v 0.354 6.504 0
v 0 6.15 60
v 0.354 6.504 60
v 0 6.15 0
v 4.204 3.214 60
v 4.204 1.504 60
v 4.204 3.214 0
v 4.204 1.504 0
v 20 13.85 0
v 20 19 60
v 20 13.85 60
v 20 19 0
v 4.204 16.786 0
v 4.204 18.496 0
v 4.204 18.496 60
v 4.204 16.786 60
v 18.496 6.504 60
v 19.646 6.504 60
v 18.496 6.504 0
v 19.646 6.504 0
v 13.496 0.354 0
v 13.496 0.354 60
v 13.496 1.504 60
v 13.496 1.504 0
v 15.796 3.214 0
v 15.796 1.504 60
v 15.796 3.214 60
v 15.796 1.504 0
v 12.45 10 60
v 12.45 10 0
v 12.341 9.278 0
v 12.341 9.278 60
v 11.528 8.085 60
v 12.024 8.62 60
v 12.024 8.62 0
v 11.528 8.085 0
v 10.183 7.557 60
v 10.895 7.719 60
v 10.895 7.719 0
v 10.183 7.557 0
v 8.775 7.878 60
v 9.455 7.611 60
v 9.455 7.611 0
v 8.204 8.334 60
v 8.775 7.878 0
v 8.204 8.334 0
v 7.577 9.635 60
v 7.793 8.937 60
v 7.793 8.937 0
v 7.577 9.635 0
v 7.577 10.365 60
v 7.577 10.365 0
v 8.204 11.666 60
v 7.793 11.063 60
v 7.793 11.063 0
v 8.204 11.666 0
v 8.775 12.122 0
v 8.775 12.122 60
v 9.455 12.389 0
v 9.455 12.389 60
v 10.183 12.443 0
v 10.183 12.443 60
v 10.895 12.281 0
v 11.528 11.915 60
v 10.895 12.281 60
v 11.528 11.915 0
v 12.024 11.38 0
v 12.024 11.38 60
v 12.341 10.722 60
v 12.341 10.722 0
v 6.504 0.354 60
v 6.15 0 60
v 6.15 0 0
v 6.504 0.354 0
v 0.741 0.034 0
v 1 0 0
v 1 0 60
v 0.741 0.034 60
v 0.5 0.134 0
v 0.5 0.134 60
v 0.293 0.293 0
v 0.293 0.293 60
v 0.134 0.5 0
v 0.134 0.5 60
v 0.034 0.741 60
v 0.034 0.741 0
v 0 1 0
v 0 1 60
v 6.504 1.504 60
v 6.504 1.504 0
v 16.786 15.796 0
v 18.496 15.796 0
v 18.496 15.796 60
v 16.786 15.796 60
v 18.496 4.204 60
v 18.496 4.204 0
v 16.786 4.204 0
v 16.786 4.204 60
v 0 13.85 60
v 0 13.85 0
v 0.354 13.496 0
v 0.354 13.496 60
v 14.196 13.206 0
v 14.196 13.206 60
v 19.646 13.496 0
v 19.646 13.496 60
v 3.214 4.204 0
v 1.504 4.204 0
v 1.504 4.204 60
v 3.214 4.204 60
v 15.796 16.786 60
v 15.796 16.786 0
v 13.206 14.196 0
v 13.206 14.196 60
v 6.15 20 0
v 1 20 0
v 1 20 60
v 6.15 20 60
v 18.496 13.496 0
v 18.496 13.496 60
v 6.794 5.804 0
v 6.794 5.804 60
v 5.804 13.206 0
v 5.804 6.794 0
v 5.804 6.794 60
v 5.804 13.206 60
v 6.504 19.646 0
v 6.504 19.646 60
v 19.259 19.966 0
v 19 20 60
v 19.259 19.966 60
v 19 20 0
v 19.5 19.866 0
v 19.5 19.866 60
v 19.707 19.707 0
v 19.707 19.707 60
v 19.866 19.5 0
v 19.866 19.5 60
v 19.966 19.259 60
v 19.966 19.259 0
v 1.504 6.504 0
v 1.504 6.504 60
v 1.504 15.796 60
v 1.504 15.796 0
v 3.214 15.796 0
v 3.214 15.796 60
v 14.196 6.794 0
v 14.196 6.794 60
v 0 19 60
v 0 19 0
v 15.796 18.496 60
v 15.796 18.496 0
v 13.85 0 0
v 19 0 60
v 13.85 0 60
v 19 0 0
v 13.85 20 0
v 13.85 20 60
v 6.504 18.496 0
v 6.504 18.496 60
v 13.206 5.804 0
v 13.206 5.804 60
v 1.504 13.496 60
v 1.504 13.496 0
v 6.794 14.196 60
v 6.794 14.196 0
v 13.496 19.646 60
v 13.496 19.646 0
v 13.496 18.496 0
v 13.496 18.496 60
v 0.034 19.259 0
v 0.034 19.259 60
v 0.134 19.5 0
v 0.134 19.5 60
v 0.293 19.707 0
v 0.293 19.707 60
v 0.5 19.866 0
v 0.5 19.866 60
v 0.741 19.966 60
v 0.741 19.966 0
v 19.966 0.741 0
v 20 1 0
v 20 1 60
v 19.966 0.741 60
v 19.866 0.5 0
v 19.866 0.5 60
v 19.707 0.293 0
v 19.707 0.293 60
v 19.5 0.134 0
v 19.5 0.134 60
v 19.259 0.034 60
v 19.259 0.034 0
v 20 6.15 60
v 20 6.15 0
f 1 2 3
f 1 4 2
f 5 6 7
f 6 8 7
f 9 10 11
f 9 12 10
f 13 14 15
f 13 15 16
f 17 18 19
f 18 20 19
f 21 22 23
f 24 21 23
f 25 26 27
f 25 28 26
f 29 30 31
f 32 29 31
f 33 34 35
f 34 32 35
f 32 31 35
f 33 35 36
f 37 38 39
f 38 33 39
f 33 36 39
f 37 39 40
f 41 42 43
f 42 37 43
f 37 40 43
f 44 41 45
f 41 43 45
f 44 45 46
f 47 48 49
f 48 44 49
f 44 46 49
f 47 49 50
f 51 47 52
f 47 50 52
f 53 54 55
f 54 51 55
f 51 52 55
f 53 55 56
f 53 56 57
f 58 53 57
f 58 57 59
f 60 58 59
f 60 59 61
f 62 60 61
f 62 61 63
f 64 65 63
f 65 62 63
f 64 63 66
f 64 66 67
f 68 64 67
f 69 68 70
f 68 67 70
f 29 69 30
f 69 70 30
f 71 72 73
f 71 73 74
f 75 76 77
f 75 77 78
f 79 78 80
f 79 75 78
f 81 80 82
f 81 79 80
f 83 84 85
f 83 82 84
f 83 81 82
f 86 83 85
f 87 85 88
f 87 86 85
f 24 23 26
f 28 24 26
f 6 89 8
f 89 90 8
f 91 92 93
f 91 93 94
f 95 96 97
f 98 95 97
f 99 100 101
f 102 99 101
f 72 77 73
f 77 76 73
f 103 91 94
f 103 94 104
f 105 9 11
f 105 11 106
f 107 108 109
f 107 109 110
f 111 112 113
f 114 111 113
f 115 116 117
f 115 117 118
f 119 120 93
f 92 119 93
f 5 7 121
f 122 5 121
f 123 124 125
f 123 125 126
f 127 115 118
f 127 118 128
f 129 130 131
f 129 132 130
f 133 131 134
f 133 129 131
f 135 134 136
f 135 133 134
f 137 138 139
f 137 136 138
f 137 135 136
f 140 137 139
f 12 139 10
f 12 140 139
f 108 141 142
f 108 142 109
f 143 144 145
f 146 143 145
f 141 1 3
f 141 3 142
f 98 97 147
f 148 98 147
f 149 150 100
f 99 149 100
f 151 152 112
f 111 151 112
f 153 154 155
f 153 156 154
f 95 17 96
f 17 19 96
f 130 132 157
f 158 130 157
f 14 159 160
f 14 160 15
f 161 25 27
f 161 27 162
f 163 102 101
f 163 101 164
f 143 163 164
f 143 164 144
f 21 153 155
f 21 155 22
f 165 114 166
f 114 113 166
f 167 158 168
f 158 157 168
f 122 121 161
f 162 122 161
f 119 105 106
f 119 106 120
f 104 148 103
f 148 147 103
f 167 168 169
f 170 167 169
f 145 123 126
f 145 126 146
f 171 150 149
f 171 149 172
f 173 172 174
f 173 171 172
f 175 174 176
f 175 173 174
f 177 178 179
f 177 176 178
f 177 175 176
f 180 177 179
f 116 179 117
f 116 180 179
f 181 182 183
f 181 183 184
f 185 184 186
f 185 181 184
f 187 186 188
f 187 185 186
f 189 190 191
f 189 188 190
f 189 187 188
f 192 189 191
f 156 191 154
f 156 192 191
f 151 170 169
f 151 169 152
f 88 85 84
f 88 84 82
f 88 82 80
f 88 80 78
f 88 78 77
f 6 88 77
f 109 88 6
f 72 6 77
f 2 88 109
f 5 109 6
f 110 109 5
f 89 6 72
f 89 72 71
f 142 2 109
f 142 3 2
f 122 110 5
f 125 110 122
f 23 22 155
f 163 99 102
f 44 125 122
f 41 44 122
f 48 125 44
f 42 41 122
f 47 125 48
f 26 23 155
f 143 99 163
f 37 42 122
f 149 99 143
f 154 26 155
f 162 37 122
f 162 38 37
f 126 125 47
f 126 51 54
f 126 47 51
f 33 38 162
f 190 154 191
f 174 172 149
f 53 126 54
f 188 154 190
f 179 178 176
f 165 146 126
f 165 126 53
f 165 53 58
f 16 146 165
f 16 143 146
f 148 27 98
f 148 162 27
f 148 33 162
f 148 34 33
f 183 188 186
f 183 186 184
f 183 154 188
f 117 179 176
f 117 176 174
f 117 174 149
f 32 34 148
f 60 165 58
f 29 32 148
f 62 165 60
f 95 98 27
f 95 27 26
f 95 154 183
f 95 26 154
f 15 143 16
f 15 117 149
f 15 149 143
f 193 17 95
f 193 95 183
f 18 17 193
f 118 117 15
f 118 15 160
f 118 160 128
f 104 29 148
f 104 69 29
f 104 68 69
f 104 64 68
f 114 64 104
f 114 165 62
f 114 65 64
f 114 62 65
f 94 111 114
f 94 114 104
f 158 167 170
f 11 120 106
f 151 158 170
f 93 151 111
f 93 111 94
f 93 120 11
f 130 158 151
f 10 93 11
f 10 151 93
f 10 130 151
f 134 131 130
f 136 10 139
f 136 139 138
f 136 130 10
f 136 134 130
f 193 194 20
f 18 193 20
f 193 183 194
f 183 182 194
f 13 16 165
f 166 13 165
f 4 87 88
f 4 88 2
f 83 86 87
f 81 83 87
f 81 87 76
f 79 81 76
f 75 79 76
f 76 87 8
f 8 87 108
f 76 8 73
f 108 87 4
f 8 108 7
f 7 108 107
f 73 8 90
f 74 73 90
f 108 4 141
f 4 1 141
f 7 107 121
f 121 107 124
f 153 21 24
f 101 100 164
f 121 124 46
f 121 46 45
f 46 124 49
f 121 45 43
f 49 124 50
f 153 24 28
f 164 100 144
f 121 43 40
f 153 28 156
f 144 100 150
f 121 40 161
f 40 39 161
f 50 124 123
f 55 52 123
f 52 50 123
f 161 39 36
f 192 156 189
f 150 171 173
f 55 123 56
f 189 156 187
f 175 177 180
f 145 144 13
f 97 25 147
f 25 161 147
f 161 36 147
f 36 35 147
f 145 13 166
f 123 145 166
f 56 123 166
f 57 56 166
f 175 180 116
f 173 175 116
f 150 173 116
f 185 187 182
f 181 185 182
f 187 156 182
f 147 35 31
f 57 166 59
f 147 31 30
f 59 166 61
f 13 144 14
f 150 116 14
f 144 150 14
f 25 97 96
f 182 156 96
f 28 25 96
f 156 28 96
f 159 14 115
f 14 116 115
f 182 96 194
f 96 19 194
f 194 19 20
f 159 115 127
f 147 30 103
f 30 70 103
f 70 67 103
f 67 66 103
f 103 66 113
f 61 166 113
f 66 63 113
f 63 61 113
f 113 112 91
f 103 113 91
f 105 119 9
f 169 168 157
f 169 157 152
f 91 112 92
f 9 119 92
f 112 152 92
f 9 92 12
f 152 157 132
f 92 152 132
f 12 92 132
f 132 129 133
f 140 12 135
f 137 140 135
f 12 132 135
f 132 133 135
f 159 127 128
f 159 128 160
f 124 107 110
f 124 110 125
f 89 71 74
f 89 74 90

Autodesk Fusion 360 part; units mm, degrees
sketch "Sketch1" plane through (0, 0, 0) normal (0, 0, 1) x (1, 0, 0)
  line L0 (0, 1) -> (0, 6.1503)
  line L1 (1, 0) -> (6.15, 0)
  line L2 (0.3536, 6.5038) -> (1.5038, 6.5038)
  line L3 (1.5038, 6.5038) -> (1.5038, 4.2038)
  line L4 (1.5038, 4.2038) -> (3.2139, 4.2038)
  line L5 (3.2139, 4.2038) -> (5.804, 6.7939)
  line L6 (6.5036, 0.3536) -> (6.5036, 1.5036)
  line L7 (6.5036, 1.5036) -> (4.2036, 1.5036)
  line L8 (4.2036, 1.5036) -> (4.2036, 3.2136)
  line L9 (4.2036, 3.2136) -> (6.7937, 5.8037)
  line L10 (0, 6.1503) -> (0.3536, 6.5038)
  line L11 (6.15, 0) -> (6.5036, 0.3536)
  circle A0 centre (10, 10) radius 2.45
  line L12 (10, 10) -> (0, 0) construction
  line L13 (0, 19) -> (0, 13.85)
  line L14 (1, 20) -> (6.15, 20)
  line L15 (0, 13.85) -> (0.3536, 13.4964)
  line L16 (0, 13.85) -> (0.5, 13.85) construction
  line L17 (0.3536, 13.4964) -> (1.5036, 13.4964)
  line L18 (1.5036, 13.4964) -> (1.5036, 15.7964)
  line L19 (0, 20) -> (10, 10) construction
  line L20 (5.804, 6.7939) -> (5.804, 13.2061)
  line L21 (5.804, 13.2061) -> (3.2139, 15.7962)
  line L22 (1.5036, 15.7964) -> (3.2139, 15.7962)
  line L23 (6.15, 20) -> (6.5036, 19.6464)
  line L24 (6.15, 20) -> (6.65, 20) construction
  line L25 (6.5036, 19.6464) -> (6.5036, 18.4964)
  line L26 (6.5036, 18.4964) -> (4.2036, 18.4964)
  line L27 (4.2036, 18.4964) -> (4.2036, 16.7864)
  line L28 (4.2036, 16.7864) -> (6.7937, 14.1963)
  line L29 (10, 10) -> (20, 20) construction
  line L30 (10, 10) -> (20, 0) construction
  line L31 (19, 20) -> (13.85, 20)
  line L32 (20, 19) -> (20, 13.85)
  line L33 (13.85, 20) -> (13.4964, 19.6464)
  line L34 (13.85, 20) -> (14.35, 20) construction
  line L35 (13.4964, 19.6464) -> (13.4964, 18.4964)
  line L36 (20, 13.85) -> (19.6464, 13.4964)
  line L37 (20, 13.85) -> (20.5, 13.85) construction
  line L38 (19.6464, 13.4964) -> (18.4964, 13.4964)
  line L39 (13.4964, 18.4964) -> (15.7964, 18.4964)
  line L40 (18.4964, 13.4964) -> (18.4964, 15.7964)
  line L41 (15.7964, 18.4964) -> (15.7964, 16.7864)
  line L42 (15.7964, 16.7864) -> (13.2064, 14.1963)
  line L43 (13.2064, 14.1963) -> (6.7937, 14.1963)
  line L44 (18.4964, 15.7964) -> (16.7864, 15.7964)
  line L45 (16.7864, 15.7964) -> (14.1963, 13.2063)
  line L46 (19, 0) -> (13.85, 0)
  line L47 (20, 1) -> (20, 6.15)
  line L48 (13.85, 0) -> (13.4964, 0.3536)
  line L49 (13.85, 0) -> (14.35, 0) construction
  line L50 (13.4964, 0.3536) -> (13.4964, 1.5036)
  line L51 (13.4964, 1.5036) -> (15.7964, 1.5036)
  line L52 (15.7964, 1.5036) -> (15.7964, 3.2136)
  line L53 (15.7964, 3.2136) -> (13.2063, 5.8037)
  line L54 (6.7937, 5.8037) -> (13.2063, 5.8037)
  line L55 (20, 6.15) -> (19.6464, 6.5036)
  line L56 (20, 6.15) -> (20.5, 6.15) construction
  line L57 (19.6464, 6.5036) -> (18.4964, 6.5036)
  line L58 (18.4964, 6.5036) -> (18.4964, 4.2036)
  line L59 (18.4964, 4.2036) -> (16.7864, 4.2036)
  line L60 (16.7864, 4.2036) -> (14.1963, 6.7937)
  line L61 (14.1963, 6.7937) -> (14.1963, 13.2063)
  arc A1 (0, 1) -> (1, 0) centre (1, 1) ccw
  arc A2 (1, 20) -> (0, 19) centre (1, 19) ccw
  arc A3 (20, 19) -> (19, 20) centre (19, 19) ccw
  arc A4 (19, 0) -> (20, 1) centre (19, 1) ccw
  dimension "d9" = 2.3
  dimension "d11" = 3.663
  dimension "d13" = 2.3
  dimension "d17" = 135
  dimension "d18" = 135
  dimension "d19" = 135
  dimension "d20" = 6.1503
  dimension "d21" = 1.1503
  dimension "d22" = 0.5
  dimension "d23" = 135
  dimension "d24" = 0.5
  dimension "d25" = 6.15
  dimension "d26" = 1.15
  dimension "d27" = 4.9
  dimension "d28" = 10
  dimension "d29" = 10
  dimension "d30" = 1.4
  dimension "d31" = 0.7
  dimension "d32" = 6.15
  dimension "d33" = 20
  dimension "d34" = 6.15
  dimension "d35" = 45
  dimension "d36" = 0.5
  dimension "d37" = 1.15
  dimension "d38" = 2.3
  dimension "d40" = 3.663
  dimension "d41" = 0.7
  dimension "d42" = 0.5
  dimension "d43" = 45
  dimension "d44" = 1.15
  dimension "d45" = 2.3
  dimension "d47" = 3.663
  dimension "d48" = 0.7
  dimension "d49" = 6.15
  dimension "d50" = 6.15
  dimension "d51" = 135
  dimension "d52" = 0.5
  dimension "d53" = 1.15
  dimension "d54" = 20
  dimension "d55" = 135
  dimension "d56" = 0.5
  dimension "d57" = 1.15
  dimension "d58" = 2.3
  dimension "d59" = 2.3
  dimension "d61" = 0.7
  dimension "d63" = 3.663
  dimension "d64" = 0.7
  dimension "d65" = 6.15
  dimension "d66" = 6.15
  dimension "d67" = 135
  dimension "d68" = 0.5
  dimension "d69" = 20
  dimension "d70" = 1.15
  dimension "d71" = 2.3
  dimension "d73" = 0.7
  dimension "d74" = 135
  dimension "d75" = 0.5
  dimension "d76" = 1.15
  dimension "d77" = 2.3
  dimension "d78" = 1.71
  dimension "d79" = 1
  dimension "d80" = 1
  dimension "d81" = 1
  dimension "d82" = 1
  dimension "d83" = 1
  dimension "d84" = 1
extrude "Extrude1" add sketch "Sketch1" along normal blind 60
